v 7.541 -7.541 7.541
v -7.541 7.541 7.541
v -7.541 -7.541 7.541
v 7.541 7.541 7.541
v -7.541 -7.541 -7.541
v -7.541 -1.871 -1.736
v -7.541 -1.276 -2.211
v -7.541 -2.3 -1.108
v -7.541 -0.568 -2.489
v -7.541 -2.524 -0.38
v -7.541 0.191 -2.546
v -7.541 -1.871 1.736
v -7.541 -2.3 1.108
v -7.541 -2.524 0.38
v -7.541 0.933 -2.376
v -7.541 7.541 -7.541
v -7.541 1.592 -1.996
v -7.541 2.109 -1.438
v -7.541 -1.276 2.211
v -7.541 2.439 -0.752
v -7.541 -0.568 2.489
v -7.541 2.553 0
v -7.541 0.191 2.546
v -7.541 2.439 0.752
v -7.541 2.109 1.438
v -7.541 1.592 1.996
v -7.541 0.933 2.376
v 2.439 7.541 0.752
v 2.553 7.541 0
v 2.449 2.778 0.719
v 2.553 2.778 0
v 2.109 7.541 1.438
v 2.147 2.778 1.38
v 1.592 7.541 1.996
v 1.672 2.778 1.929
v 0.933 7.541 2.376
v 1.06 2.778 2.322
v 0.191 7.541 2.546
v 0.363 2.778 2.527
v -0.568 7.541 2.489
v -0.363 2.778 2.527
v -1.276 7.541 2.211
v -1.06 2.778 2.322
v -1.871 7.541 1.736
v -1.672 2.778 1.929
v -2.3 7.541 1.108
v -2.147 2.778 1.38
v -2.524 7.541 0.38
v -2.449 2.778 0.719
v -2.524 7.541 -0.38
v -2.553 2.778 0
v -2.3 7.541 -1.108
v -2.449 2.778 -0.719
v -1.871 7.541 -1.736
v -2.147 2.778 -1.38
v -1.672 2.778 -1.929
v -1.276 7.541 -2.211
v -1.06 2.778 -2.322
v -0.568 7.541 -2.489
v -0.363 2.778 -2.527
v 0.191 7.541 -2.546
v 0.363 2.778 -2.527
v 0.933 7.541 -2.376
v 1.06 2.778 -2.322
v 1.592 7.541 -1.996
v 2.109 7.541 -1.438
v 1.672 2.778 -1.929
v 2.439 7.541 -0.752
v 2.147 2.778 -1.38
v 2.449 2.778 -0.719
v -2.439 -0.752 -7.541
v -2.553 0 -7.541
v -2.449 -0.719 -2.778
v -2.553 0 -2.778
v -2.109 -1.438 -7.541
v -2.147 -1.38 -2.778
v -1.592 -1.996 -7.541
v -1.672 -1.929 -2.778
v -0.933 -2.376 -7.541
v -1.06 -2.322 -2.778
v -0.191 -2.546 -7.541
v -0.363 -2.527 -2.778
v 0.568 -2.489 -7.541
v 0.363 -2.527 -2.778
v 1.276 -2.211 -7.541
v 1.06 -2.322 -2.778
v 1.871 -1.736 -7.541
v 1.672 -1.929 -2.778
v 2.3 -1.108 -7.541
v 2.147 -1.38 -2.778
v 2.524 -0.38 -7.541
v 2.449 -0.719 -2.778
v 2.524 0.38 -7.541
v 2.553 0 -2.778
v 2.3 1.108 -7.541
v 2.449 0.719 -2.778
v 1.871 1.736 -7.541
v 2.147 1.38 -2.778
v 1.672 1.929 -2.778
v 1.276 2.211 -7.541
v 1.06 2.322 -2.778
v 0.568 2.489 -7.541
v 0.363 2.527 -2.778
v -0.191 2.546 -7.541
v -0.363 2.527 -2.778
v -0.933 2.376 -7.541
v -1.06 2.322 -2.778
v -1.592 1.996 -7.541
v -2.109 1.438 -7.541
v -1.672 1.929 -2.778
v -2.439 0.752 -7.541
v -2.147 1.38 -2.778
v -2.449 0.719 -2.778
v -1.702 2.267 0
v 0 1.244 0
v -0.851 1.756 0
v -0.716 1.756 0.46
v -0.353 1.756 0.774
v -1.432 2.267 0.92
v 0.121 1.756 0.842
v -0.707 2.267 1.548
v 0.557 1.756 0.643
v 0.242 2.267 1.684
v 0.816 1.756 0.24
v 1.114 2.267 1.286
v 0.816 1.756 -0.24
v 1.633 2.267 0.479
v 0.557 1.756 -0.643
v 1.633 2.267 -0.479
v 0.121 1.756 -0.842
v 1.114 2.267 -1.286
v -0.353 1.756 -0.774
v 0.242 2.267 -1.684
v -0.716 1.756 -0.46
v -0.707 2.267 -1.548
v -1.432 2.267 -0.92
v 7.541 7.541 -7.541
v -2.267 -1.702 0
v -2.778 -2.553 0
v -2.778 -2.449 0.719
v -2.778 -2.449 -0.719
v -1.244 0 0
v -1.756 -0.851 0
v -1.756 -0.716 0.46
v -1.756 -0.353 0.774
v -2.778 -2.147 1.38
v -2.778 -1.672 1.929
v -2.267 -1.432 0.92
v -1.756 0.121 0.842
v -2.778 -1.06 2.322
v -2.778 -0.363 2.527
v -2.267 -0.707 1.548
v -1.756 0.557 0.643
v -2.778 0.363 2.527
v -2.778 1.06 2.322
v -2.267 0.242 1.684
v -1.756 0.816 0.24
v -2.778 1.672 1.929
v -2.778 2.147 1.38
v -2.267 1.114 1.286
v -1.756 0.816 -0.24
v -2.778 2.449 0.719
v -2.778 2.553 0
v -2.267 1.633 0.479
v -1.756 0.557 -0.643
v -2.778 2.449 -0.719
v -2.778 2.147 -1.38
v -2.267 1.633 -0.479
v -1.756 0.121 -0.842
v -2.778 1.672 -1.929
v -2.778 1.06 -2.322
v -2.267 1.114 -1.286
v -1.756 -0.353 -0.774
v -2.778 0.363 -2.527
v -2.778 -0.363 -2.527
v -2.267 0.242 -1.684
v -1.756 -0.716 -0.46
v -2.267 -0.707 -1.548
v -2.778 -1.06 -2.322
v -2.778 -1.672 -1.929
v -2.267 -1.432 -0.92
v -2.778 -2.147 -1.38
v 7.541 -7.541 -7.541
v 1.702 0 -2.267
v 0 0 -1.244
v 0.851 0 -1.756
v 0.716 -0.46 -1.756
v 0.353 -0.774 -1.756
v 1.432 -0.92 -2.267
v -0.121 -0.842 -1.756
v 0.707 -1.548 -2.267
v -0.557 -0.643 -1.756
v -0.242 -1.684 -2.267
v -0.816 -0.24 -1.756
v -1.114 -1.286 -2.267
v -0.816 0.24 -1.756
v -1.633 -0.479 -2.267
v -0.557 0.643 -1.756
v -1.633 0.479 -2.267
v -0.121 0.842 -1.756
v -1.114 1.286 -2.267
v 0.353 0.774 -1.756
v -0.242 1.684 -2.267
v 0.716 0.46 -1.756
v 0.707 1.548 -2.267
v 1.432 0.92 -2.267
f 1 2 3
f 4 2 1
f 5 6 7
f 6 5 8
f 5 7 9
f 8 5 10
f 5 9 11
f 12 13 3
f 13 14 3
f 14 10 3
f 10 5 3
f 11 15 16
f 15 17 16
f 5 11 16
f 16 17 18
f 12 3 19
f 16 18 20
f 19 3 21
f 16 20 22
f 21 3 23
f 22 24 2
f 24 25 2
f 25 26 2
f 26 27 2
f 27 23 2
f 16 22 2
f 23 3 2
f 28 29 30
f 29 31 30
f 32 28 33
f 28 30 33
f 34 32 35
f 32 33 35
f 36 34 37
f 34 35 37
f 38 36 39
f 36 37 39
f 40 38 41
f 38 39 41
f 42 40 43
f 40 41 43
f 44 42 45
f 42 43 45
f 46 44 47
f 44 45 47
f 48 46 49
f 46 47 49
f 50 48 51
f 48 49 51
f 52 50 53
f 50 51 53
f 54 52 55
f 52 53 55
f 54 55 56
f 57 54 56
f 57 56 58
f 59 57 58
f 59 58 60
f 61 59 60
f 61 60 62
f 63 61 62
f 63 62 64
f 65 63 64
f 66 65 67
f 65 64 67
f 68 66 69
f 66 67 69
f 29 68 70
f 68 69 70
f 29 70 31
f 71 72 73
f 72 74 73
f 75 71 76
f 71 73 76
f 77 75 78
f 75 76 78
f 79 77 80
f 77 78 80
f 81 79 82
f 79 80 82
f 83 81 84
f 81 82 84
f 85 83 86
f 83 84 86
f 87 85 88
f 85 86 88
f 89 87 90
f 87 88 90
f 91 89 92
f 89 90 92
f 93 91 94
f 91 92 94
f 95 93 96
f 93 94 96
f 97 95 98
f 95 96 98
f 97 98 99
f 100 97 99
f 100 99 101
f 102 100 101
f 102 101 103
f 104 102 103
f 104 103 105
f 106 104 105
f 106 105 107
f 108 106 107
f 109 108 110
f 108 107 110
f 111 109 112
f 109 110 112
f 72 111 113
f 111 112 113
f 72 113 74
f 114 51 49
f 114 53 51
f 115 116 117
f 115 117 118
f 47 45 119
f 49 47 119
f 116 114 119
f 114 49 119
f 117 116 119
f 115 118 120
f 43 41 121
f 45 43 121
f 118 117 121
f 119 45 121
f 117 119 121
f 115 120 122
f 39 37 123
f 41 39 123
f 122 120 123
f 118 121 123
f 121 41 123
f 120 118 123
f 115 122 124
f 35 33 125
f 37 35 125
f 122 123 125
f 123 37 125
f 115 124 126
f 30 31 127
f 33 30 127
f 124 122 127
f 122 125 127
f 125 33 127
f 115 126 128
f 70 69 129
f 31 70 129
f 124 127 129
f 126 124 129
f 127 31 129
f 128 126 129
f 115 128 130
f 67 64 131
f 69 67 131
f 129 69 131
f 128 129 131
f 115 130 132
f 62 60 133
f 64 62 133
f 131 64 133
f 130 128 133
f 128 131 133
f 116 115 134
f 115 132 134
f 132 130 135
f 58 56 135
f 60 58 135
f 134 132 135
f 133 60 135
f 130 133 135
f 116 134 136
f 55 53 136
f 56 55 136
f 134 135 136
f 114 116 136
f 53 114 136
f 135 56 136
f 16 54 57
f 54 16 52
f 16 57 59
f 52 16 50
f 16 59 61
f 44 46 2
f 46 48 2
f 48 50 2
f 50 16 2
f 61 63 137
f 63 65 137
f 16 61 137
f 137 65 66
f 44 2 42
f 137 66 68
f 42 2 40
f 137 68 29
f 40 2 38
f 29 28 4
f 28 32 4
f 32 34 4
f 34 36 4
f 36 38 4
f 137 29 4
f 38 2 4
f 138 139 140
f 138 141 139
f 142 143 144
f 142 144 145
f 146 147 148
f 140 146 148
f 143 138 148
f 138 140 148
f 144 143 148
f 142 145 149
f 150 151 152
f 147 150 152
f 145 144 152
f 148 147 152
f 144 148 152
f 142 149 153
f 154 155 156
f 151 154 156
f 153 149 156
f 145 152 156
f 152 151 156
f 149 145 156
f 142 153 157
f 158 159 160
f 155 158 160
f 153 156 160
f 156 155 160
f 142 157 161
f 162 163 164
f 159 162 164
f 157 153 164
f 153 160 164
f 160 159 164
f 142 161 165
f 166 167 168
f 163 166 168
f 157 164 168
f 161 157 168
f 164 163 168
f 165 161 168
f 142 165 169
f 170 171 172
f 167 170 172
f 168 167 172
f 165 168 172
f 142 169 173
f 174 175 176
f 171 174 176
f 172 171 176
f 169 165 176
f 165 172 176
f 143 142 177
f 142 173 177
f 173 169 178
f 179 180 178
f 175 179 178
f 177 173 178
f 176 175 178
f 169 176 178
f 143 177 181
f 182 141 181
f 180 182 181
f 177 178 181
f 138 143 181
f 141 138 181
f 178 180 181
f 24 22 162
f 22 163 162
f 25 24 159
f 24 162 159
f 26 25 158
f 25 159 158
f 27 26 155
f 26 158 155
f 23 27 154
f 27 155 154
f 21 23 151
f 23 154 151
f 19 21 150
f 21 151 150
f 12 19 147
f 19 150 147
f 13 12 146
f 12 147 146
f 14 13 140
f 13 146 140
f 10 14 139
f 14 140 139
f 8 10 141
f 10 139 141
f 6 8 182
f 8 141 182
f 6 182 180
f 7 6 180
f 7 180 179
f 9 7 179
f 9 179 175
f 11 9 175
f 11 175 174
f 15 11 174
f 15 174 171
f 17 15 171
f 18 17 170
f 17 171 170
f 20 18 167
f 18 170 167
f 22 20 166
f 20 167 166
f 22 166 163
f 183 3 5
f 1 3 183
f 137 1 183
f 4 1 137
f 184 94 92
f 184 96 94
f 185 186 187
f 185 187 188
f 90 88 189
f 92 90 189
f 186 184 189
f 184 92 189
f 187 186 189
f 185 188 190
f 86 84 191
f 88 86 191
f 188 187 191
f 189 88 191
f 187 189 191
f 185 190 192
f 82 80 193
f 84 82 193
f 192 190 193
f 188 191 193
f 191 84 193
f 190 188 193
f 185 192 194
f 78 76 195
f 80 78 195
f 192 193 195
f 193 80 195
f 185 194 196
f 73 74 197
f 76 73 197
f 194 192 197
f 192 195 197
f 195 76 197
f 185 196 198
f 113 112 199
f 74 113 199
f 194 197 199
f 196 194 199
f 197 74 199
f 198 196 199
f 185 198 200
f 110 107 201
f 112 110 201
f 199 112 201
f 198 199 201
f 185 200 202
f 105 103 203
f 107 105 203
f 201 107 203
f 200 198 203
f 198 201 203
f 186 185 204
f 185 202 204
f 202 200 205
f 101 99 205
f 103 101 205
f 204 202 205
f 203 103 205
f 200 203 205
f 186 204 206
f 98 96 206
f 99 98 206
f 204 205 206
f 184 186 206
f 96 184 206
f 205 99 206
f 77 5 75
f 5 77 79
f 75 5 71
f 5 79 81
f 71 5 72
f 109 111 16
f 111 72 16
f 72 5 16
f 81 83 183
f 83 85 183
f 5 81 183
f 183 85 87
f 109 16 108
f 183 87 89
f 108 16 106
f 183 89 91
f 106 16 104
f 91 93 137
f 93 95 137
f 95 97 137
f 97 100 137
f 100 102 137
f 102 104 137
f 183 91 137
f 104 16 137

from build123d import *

# Parameters (mm, degrees)
F0_W     = 15.08125
F0_H     = 15.08125
F1_DEPTH = 7.540625
F5_D     = 5.1054
F5_DEPTH = 4.7625
F5_TIP   = 1.5338169022
F6_D     = 5.1054
F6_DEPTH = 4.7625
F6_TIP   = 1.5338169022
F7_D     = 5.1054
F7_DEPTH = 4.7625
F7_TIP   = 1.5338169022


with BuildPart() as f1:
    # F0 (on Top) → F1 (new body, symmetric)
    with BuildSketch(Plane.XY):
        Rectangle(F0_W, F0_H)
    extrude(amount=F1_DEPTH, both=True)

    # F5
    with Locations(Plane(origin=(0, 0, -7.540625), x_dir=(1, 0, 0), z_dir=(0, 0, -1))):
        with Locations((0, 0)):
            Hole(F5_D / 2, depth=F5_DEPTH)
            with Locations((0, 0, -(F5_DEPTH + F5_TIP / 2))):  # 118° drill point
                Cone(0, F5_D / 2, F5_TIP, mode=Mode.SUBTRACT)

    # F6
    with Locations(Plane(origin=(0, 7.540625, 0), x_dir=(-1, 0, 0), z_dir=(0, 1, 0))):
        with Locations((0, 0)):
            Hole(F6_D / 2, depth=F6_DEPTH)
            with Locations((0, 0, -(F6_DEPTH + F6_TIP / 2))):  # 118° drill point
                Cone(0, F6_D / 2, F6_TIP, mode=Mode.SUBTRACT)

    # F7
    with Locations(Plane(origin=(-7.540625, 0, 0), x_dir=(0, -1, 0), z_dir=(-1, 0, 0))):
        with Locations((0, 0)):
            Hole(F7_D / 2, depth=F7_DEPTH)
            with Locations((0, 0, -(F7_DEPTH + F7_TIP / 2))):  # 118° drill point
                Cone(0, F7_D / 2, F7_TIP, mode=Mode.SUBTRACT)


solid = f1.part
